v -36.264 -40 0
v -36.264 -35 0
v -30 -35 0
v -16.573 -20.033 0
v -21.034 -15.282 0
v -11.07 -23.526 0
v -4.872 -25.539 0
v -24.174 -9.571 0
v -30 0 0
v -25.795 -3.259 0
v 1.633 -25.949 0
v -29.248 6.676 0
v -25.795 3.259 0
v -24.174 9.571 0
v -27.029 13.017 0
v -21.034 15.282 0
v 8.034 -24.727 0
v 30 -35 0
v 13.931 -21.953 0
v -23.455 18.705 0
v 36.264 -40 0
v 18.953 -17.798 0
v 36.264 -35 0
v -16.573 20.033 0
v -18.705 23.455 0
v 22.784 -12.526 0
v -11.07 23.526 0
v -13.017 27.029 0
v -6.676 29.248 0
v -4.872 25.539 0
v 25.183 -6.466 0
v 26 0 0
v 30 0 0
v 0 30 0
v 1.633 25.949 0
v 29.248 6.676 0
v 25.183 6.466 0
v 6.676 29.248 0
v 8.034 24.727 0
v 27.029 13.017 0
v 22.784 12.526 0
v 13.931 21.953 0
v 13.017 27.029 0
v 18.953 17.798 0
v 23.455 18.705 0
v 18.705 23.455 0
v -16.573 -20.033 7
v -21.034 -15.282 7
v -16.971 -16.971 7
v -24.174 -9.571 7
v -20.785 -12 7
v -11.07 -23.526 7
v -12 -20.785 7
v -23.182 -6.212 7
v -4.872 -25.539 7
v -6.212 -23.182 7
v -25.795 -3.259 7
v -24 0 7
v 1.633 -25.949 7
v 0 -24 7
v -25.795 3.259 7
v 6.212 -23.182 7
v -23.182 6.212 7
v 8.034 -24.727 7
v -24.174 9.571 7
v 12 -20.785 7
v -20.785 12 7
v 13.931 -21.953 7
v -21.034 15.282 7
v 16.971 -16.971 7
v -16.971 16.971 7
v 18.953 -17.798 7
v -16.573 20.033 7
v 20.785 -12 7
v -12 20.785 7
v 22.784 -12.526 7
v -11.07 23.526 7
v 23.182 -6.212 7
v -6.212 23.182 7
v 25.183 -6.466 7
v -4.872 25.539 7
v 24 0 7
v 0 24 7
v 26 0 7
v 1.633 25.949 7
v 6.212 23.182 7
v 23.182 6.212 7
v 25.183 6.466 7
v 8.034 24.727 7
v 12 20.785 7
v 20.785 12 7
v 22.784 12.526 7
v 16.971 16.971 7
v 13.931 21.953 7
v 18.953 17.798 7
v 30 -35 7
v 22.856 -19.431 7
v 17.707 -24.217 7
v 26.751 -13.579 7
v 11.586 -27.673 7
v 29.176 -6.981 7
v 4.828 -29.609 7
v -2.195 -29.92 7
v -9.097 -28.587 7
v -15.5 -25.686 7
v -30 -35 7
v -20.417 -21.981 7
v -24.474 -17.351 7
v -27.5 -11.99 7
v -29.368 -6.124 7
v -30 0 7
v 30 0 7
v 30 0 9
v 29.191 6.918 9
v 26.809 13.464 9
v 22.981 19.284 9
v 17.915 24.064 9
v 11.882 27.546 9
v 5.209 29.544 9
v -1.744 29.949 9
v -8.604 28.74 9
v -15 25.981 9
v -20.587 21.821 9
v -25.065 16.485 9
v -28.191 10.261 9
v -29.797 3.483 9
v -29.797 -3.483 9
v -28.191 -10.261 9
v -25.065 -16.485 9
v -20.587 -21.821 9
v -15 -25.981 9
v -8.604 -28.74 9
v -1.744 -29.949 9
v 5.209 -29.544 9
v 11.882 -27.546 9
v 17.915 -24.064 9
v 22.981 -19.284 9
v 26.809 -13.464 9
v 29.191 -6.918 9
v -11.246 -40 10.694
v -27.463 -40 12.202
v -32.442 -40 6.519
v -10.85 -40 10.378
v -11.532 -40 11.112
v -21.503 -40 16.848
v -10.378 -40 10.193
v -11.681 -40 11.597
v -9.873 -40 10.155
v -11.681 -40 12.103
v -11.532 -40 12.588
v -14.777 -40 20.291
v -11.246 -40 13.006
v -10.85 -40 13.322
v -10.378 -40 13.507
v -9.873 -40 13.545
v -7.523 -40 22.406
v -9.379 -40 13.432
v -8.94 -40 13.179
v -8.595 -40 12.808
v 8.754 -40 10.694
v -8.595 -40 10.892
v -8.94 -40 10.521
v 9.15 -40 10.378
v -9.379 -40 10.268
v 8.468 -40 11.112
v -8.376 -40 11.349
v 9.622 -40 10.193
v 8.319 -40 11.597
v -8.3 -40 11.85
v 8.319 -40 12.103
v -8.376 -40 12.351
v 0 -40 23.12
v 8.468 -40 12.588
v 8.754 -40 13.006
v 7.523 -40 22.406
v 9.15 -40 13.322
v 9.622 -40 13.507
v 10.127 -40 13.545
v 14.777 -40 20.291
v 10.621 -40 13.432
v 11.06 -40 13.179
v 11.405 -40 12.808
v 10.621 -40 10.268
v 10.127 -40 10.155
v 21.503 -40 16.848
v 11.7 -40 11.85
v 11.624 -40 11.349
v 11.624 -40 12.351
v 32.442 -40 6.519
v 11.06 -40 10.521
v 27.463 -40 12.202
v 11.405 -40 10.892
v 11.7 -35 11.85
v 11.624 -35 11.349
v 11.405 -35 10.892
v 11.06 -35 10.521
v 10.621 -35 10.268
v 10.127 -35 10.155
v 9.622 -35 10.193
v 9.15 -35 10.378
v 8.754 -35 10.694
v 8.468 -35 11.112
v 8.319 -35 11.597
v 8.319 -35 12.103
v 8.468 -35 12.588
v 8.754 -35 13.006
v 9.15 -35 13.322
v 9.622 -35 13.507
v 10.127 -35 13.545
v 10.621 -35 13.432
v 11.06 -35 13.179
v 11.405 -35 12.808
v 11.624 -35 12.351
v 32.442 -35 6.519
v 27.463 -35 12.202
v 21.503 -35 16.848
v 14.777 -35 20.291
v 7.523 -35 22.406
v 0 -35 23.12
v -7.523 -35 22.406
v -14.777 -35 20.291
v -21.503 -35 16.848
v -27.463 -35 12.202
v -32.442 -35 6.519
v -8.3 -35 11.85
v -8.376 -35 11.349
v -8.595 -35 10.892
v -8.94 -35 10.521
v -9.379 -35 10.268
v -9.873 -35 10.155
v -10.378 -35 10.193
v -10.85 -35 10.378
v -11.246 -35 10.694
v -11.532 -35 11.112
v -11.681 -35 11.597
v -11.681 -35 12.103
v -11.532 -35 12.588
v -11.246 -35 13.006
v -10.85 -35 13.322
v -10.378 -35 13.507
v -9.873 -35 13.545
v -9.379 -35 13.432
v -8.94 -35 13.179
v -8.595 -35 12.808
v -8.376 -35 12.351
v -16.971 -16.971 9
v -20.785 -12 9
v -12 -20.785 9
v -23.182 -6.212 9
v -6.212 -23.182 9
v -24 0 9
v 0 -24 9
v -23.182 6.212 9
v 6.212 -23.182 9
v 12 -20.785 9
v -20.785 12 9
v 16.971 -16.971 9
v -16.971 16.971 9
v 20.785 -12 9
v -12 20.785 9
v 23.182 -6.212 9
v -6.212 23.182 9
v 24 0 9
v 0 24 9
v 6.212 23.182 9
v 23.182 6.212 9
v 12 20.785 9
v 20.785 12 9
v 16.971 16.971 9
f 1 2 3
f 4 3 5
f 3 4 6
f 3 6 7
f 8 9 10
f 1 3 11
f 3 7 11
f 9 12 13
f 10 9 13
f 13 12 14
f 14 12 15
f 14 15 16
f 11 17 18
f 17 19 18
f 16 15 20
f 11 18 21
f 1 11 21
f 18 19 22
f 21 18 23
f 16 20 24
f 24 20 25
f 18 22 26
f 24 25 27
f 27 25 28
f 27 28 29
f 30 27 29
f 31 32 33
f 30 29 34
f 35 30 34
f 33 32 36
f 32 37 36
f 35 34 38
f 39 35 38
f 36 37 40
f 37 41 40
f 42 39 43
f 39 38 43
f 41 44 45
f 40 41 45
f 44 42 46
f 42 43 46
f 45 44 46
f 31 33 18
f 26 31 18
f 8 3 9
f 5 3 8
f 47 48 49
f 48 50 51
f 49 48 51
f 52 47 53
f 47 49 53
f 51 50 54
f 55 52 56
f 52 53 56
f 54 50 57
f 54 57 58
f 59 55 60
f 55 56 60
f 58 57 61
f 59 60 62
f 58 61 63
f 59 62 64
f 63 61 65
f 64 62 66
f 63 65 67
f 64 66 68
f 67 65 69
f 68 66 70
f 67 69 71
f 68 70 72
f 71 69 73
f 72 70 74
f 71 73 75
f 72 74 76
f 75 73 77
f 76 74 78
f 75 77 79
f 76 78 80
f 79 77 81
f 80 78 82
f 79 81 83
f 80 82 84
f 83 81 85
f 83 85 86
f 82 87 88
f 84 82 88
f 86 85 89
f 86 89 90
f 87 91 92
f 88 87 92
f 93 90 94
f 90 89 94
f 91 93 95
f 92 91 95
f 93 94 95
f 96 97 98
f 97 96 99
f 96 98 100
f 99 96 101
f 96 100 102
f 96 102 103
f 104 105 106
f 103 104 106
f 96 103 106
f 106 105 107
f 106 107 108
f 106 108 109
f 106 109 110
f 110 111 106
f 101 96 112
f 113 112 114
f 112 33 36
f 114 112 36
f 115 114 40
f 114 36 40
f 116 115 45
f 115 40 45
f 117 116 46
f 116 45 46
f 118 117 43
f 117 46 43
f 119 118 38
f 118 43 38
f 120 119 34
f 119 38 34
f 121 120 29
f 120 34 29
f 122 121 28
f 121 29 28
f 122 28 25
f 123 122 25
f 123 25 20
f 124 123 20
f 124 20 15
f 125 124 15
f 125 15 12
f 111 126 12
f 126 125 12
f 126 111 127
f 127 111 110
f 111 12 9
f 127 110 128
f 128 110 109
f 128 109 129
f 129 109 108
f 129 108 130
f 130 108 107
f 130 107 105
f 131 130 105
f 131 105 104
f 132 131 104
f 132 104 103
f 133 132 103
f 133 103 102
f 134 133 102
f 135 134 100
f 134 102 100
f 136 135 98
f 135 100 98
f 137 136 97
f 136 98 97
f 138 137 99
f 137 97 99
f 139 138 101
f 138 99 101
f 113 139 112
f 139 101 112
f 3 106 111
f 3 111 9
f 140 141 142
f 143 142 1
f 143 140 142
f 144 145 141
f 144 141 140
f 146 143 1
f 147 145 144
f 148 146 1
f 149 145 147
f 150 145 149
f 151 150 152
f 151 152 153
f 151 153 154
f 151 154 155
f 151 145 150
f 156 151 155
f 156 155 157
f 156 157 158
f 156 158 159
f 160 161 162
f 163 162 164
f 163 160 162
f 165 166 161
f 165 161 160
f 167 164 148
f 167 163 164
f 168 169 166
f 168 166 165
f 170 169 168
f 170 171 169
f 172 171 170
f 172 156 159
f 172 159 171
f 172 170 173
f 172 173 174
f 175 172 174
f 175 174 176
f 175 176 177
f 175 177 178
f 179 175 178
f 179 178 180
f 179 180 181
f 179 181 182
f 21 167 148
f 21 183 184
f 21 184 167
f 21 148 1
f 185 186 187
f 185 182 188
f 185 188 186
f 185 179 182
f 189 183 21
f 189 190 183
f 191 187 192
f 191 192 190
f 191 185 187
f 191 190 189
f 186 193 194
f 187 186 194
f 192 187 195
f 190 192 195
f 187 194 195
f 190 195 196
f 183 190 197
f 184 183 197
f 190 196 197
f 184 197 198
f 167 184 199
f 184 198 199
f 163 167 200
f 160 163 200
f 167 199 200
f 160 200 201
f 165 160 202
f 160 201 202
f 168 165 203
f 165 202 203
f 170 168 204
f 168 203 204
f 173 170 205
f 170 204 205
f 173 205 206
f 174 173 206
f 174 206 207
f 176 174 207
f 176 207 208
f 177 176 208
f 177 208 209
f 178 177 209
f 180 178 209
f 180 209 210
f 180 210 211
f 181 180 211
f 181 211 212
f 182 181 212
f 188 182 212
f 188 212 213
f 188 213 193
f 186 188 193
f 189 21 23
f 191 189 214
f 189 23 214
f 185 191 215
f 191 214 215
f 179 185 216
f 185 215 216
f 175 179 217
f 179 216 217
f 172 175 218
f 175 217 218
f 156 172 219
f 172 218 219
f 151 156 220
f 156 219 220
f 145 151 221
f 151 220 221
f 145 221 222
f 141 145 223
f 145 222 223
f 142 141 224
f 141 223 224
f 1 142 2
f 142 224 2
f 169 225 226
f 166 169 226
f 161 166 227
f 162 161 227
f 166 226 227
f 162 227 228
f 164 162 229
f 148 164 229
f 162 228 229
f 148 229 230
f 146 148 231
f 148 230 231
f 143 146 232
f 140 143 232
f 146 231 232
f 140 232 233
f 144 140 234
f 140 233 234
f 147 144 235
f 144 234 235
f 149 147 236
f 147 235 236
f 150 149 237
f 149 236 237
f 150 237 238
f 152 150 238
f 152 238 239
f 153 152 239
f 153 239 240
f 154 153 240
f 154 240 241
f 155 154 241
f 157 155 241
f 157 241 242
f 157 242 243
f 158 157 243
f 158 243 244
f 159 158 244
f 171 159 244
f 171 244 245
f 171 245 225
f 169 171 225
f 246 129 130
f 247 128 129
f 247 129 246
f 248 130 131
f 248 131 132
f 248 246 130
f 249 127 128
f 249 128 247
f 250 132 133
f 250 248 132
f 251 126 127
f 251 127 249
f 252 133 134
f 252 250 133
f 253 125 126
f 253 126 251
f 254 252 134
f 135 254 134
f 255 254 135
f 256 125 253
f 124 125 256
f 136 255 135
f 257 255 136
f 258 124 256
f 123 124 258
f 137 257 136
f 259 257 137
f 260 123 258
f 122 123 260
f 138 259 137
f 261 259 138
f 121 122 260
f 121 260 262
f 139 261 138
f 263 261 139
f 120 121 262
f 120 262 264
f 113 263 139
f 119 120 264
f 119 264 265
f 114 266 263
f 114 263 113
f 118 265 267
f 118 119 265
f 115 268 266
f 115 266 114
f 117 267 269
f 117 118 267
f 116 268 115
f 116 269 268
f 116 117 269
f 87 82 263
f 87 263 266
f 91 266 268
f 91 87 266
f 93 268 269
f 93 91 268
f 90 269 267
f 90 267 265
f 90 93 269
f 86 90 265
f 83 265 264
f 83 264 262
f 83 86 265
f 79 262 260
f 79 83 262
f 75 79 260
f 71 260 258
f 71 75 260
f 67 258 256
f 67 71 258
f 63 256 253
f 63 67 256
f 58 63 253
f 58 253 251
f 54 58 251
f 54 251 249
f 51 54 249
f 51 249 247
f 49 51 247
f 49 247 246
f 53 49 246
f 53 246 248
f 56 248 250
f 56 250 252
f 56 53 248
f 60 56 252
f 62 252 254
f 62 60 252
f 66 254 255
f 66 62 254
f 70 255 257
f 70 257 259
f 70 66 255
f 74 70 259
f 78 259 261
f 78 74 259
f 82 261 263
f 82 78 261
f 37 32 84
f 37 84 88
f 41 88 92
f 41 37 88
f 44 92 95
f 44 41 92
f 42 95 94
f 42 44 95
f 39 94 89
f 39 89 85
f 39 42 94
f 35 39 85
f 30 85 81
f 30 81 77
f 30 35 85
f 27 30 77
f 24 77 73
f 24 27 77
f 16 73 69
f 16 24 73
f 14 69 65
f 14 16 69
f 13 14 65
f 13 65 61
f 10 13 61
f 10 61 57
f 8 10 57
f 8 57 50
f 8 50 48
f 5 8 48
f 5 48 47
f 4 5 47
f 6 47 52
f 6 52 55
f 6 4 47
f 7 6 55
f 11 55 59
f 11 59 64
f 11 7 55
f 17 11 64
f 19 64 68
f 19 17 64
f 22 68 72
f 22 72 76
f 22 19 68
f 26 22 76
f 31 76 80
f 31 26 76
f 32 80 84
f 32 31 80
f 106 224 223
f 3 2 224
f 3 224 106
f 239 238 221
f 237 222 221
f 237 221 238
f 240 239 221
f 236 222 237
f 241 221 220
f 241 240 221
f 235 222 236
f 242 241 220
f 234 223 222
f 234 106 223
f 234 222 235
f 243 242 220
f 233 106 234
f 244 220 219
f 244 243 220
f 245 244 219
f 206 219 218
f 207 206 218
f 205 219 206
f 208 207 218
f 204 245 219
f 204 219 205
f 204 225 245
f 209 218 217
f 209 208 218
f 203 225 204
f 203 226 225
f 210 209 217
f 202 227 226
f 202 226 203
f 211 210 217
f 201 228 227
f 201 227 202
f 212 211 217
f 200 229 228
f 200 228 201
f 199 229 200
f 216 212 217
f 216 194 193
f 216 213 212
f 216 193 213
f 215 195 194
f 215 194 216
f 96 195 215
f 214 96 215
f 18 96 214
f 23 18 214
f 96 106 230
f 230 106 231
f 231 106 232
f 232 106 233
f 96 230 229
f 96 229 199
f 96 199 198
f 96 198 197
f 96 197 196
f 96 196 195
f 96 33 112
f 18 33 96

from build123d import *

# Parameters (mm, degrees)
SKETCH_1_R          = 26
EXTRUDE_1_DEPTH     = 7
EXTRUDE_3_DEPTH     = 5
SKETCH_4_R          = 30
SKETCH_4_R_2        = 24
EXTRUDE_4_DEPTH     = 2
EXTRUDE_5_DEPTH     = 7
EXTRUDE_6_DEPTH     = 2
CUT_EXTRUDE_2_DEPTH = 2
SKETCH_11_R         = 1.7
CUT_EXTRUDE_3_DEPTH = 10


with BuildPart() as part:
    # 草图1 → 凸台-拉伸1 (new body)
    with BuildSketch(Plane.XY):
        with BuildLine():
            Line((-15.5, -38), (15.5, -38))
            Line((15.5, -38), (15.5, -25.685599078))
            ThreePointArc((15.5, -25.685599078), (0, 30), (-15.5, -25.685599078))
            Line((-15.5, -25.685599078), (-15.5, -38))
        make_face()
        Circle(SKETCH_1_R, mode=Mode.SUBTRACT)
    extrude(amount=EXTRUDE_1_DEPTH)

    # 草图3 → 凸台-拉伸3 (add)
    with BuildSketch(Plane.XZ.offset(38)):
        with BuildLine():
            Line((-36.263833223, 0), (36.263833223, 0))
            ThreePointArc((36.263833223, 0), (0, 23.12), (-36.263833223, 0))
        make_face()
    extrude(amount=-EXTRUDE_3_DEPTH)

    # 草图4 → 凸台-拉伸4 (add)
    with BuildSketch(Plane.XY.offset(7)):
        Circle(SKETCH_4_R)
        Circle(SKETCH_4_R_2, mode=Mode.SUBTRACT)
    extrude(amount=EXTRUDE_4_DEPTH)

    # 草图5 → 凸台-拉伸5 (add)
    with BuildSketch(Plane(origin=(0, 0, 0), x_dir=(-1, 0, 0), z_dir=(0, 0, -1))):
        with BuildLine():
            Line((-30, -33), (-15.5, -33))
            Line((-15.5, -33), (-15.5, -25.685599078))
            ThreePointArc((-15.5, -25.685599078), (-26.124700955, -14.747881204), (-30, 0))
            Line((-30, 0), (-30, -33))
        make_face()
        with BuildLine():
            Line((15.5, -33), (15.5, -25.685599078))
            ThreePointArc((15.5, -25.685599078), (26.124700955, -14.747881204), (30, 0))
            Line((30, 0), (30, -33))
            Line((30, -33), (15.5, -33))
        make_face()
    extrude(amount=-EXTRUDE_5_DEPTH)

    # 草图8 → 凸台-拉伸6 (add)
    with BuildSketch(Plane.XZ.offset(38)):
        with BuildLine():
            Line((-36.263833223, 0), (36.263833223, 0))
            ThreePointArc((36.263833223, 0), (0, 23.12), (-36.263833223, 0))
        make_face()
    extrude(amount=EXTRUDE_6_DEPTH)

    # 草图9 → 切除-拉伸2 (cut)
    with BuildSketch(Plane(origin=(0, -33, 0), x_dir=(1, 0, 0), z_dir=(0, 1, 0))):
        with BuildLine():
            Line((30, -7), (-30, -7))
            Line((-30, -7), (-30, 0))
            Line((-30, 0), (-36.263833223, 0))
            ThreePointArc((-36.263833223, 0), (0, -23.12), (36.263833223, 0))
            Line((36.263833223, 0), (30, 0))
            Line((30, 0), (30, -7))
        make_face()
    extrude(amount=-CUT_EXTRUDE_2_DEPTH, mode=Mode.SUBTRACT)

    # 草图11 → 切除-拉伸3 (cut)
    with BuildSketch(Plane(origin=(0, -35, 0), x_dir=(1, 0, 0), z_dir=(0, 1, 0))):
        with Locations((-10, -11.85)):
            Circle(SKETCH_11_R)
        with Locations((10, -11.85)):
            Circle(SKETCH_11_R)
    extrude(amount=-CUT_EXTRUDE_3_DEPTH, mode=Mode.SUBTRACT)


solid = part.part
